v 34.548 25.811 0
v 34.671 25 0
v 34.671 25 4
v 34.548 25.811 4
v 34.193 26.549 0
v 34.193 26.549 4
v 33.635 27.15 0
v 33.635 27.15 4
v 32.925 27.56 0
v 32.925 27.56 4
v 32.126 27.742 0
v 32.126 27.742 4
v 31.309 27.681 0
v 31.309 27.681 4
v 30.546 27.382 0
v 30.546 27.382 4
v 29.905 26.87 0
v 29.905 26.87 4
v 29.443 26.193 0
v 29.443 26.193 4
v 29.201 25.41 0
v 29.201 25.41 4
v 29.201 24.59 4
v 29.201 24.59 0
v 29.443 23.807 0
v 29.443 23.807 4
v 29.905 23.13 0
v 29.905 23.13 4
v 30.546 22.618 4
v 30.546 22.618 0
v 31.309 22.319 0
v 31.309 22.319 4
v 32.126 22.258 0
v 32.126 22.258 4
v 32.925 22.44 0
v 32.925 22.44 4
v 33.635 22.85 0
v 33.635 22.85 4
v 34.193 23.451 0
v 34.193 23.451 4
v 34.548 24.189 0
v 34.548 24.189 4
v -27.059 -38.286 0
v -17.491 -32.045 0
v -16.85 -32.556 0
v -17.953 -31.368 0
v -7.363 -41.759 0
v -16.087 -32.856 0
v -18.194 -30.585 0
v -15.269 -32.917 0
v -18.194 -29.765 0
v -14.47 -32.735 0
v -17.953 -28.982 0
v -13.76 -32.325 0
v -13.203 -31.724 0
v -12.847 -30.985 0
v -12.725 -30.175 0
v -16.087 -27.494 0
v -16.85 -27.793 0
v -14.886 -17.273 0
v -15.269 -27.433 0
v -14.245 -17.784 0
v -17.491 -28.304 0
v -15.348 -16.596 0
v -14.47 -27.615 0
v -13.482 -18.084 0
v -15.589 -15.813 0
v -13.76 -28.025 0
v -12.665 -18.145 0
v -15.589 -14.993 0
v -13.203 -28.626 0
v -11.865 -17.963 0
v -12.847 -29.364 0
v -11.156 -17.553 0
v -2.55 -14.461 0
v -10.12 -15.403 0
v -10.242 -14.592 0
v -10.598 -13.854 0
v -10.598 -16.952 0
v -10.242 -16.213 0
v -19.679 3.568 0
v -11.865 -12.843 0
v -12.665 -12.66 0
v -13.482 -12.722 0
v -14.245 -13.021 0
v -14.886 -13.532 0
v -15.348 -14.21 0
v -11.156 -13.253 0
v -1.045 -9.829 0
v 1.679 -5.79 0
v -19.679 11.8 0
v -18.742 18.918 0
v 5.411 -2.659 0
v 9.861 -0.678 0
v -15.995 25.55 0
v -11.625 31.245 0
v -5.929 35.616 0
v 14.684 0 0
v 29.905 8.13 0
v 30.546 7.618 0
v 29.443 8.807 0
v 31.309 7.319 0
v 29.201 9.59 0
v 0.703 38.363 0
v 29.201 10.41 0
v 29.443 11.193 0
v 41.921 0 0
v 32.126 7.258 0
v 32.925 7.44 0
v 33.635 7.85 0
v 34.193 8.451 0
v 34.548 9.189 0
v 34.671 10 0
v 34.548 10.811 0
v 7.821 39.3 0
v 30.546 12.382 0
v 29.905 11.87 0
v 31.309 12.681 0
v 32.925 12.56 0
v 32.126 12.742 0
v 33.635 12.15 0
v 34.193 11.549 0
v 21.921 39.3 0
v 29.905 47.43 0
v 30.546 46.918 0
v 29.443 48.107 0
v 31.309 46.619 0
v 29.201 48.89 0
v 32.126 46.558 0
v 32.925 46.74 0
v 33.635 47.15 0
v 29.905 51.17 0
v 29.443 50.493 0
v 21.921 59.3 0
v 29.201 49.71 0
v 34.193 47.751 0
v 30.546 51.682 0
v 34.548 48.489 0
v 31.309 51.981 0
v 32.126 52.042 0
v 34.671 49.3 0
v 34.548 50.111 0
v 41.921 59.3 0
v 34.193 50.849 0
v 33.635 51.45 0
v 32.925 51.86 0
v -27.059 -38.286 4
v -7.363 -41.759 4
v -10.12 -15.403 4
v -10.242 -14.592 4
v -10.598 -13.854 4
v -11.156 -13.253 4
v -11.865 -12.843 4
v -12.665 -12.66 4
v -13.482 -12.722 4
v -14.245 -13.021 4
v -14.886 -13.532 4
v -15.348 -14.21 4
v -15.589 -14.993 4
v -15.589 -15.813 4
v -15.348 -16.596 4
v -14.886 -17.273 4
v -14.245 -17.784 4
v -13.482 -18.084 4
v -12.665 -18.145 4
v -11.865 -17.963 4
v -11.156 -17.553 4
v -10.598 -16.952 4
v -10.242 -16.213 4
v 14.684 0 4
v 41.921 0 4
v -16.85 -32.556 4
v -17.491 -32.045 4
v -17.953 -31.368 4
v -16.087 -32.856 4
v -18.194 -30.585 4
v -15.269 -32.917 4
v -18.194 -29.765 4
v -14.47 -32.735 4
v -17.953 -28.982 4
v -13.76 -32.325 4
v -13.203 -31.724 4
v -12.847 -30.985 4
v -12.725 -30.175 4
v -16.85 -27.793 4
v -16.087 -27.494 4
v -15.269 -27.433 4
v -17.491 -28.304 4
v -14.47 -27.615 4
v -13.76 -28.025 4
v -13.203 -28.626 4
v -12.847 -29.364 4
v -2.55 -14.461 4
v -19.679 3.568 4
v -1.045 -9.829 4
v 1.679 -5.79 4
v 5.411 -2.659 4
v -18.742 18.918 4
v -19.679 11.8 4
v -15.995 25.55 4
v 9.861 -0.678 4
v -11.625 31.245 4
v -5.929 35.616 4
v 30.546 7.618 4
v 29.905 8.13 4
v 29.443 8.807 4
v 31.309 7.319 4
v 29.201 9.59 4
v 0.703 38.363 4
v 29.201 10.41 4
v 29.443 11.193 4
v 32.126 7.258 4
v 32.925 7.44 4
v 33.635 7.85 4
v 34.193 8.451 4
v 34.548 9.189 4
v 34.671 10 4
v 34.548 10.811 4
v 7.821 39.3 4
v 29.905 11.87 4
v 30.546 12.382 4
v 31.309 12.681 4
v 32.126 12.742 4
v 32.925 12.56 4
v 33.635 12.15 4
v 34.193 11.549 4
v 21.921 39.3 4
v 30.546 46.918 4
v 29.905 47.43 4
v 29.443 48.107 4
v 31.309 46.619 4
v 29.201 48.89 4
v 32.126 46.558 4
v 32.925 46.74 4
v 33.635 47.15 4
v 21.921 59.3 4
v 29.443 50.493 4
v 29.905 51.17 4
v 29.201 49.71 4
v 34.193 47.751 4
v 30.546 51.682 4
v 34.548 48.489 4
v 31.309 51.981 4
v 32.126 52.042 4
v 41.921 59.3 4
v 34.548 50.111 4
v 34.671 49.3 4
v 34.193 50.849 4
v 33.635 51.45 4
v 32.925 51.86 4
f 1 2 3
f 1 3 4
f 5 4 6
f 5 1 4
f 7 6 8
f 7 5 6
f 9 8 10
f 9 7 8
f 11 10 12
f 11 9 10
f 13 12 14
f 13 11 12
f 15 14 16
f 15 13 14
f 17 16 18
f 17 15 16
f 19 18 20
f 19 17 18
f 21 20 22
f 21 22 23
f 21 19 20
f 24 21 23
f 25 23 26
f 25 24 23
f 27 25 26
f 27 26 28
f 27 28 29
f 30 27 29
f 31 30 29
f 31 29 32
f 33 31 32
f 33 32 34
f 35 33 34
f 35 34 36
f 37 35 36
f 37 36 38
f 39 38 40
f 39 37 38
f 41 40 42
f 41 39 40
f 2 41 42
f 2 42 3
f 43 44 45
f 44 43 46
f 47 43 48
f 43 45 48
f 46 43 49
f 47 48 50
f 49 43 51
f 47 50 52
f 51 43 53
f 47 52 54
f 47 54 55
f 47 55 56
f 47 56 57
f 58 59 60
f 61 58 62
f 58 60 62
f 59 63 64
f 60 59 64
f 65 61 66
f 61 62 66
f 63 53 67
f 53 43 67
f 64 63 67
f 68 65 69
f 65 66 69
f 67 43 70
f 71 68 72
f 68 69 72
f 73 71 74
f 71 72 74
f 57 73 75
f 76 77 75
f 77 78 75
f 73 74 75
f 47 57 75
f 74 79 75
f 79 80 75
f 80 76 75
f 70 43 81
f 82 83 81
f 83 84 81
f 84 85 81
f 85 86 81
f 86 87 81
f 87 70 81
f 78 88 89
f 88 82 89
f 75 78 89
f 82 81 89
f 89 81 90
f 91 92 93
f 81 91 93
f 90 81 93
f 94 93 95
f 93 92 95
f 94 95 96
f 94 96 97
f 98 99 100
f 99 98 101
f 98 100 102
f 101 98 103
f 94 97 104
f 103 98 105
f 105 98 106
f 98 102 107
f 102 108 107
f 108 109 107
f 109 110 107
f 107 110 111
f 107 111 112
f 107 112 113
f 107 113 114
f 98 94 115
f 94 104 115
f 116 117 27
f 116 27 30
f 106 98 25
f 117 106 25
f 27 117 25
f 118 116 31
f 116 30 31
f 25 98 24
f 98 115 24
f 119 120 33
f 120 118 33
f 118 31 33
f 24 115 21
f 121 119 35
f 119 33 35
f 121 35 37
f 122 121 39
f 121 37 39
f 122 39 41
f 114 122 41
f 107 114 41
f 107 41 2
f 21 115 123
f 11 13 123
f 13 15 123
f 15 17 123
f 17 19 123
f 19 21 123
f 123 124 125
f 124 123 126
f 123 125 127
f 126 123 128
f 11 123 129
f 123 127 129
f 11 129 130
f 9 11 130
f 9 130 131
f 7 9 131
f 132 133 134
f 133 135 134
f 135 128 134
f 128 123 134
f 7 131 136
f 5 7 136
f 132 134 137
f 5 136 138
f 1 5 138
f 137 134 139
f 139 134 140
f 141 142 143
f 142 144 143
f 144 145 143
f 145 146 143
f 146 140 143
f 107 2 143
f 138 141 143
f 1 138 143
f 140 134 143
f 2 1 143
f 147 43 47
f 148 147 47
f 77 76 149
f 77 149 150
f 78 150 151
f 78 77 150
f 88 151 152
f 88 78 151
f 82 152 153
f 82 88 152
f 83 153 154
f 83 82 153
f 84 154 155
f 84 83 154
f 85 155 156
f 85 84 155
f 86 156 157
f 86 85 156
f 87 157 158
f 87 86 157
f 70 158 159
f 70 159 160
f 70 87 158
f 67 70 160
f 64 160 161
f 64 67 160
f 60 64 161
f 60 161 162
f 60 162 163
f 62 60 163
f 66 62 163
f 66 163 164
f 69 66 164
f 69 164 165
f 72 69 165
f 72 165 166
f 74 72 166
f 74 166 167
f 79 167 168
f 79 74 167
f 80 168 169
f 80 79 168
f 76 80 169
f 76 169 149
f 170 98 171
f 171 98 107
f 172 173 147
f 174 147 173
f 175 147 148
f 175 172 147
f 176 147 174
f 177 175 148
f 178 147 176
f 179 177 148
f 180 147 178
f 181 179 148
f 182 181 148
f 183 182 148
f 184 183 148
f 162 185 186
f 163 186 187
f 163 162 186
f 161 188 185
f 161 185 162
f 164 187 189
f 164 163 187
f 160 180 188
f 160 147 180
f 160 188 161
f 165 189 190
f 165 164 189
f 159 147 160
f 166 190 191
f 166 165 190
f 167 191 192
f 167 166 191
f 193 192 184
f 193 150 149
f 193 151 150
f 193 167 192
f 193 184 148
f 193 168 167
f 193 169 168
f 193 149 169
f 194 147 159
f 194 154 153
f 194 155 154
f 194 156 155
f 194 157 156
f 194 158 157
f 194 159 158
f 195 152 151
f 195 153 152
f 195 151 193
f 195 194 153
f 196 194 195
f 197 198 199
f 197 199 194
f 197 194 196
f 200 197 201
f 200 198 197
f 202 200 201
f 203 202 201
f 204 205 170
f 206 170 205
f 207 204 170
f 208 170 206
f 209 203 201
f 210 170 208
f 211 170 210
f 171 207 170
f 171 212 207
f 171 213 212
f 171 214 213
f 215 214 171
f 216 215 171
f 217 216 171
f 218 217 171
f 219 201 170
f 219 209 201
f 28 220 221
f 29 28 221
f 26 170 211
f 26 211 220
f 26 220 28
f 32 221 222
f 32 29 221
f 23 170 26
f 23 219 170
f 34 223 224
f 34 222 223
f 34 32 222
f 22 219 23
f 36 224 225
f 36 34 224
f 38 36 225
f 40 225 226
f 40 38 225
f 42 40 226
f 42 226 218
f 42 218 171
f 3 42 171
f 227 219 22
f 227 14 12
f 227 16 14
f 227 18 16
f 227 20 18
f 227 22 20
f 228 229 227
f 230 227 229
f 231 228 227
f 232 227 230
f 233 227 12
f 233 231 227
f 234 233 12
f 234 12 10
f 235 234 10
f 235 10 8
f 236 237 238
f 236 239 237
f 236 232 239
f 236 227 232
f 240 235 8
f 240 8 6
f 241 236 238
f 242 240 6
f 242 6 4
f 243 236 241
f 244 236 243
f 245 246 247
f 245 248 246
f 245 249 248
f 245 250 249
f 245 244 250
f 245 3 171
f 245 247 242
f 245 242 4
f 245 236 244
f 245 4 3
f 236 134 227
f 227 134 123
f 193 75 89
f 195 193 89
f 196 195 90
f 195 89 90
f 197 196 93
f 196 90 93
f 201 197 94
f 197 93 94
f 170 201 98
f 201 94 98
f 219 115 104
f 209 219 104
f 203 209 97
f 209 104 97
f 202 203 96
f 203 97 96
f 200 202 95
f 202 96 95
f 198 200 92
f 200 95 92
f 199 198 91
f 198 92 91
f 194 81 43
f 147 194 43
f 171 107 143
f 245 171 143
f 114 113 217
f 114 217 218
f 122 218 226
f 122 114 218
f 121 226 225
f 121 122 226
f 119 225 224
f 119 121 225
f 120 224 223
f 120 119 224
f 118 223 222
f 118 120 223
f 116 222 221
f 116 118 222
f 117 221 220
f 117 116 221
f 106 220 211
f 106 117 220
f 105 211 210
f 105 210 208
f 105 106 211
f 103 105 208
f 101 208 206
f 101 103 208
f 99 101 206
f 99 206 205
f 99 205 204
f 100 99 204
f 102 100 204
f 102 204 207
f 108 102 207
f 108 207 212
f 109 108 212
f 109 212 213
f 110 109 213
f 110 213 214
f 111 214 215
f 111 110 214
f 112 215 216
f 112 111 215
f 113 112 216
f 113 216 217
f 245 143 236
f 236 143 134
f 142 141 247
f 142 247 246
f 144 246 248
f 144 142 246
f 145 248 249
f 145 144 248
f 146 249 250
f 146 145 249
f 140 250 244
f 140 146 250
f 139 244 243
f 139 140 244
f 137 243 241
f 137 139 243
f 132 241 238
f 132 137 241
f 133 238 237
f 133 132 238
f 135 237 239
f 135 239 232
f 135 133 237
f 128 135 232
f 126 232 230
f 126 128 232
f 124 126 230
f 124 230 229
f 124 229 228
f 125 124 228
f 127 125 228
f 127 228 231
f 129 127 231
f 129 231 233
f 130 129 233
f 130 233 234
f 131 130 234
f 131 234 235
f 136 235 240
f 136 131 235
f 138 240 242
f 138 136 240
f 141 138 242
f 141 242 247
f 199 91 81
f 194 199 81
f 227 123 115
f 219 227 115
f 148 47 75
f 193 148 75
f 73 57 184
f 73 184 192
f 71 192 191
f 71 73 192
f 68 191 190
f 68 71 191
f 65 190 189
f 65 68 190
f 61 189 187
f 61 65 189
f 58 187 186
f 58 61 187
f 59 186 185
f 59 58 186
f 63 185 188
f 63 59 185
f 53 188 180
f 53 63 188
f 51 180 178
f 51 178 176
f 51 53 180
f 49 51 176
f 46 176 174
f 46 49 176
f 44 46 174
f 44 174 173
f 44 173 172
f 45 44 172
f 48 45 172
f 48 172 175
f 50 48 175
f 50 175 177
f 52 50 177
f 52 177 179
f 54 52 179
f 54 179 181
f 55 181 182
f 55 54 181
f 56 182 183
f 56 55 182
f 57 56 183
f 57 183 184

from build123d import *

# Parameters (mm, degrees)
SKETCH1_R           = 2.75
BOSS_EXTRUDE1_DEPTH = 4


with BuildPart() as part:
    # Sketch1 → Boss-Extrude1 (new body)
    with BuildSketch(Plane.XY):
        with BuildLine():
            Line((14.684243546, 0), (41.920581655, 0))
            Line((41.920581655, 0), (41.920581655, 59.3))
            Line((41.920581655, 59.3), (21.920581655, 59.3))
            Line((21.920581655, 59.3), (21.920581655, 39.3))
            Line((21.920581655, 39.3), (7.820581655, 39.3))
            ThreePointArc((7.820581655, 39.3), (-11.624854827, 31.245436483), (-19.679418345, 11.8))
            Line((-19.679418345, 11.8), (-19.679418345, 3.567882185))
            Line((-19.679418345, 3.567882185), (-27.059465895, -38.286447318))
            Line((-27.059465895, -38.286447318), (-7.363310835, -41.759410871))
            Line((-7.363310835, -41.759410871), (-2.549892132, -14.461156891))
            ThreePointArc((-2.549892132, -14.461156891), (3.435460376, -4.094222245), (14.684243546, 0))
        make_face()
        with Locations((31.920581655, 49.3)):
            Circle(SKETCH1_R, mode=Mode.SUBTRACT)
        with Locations((31.920581655, 25)):
            Circle(SKETCH1_R, mode=Mode.SUBTRACT)
        with Locations((31.920581655, 10)):
            Circle(SKETCH1_R, mode=Mode.SUBTRACT)
        with Locations((-15.474906589, -30.174851565)):
            Circle(SKETCH1_R, mode=Mode.SUBTRACT)
        with Locations((-12.870183924, -15.402735269)):
            Circle(SKETCH1_R, mode=Mode.SUBTRACT)
    extrude(amount=BOSS_EXTRUDE1_DEPTH)


solid = part.part
